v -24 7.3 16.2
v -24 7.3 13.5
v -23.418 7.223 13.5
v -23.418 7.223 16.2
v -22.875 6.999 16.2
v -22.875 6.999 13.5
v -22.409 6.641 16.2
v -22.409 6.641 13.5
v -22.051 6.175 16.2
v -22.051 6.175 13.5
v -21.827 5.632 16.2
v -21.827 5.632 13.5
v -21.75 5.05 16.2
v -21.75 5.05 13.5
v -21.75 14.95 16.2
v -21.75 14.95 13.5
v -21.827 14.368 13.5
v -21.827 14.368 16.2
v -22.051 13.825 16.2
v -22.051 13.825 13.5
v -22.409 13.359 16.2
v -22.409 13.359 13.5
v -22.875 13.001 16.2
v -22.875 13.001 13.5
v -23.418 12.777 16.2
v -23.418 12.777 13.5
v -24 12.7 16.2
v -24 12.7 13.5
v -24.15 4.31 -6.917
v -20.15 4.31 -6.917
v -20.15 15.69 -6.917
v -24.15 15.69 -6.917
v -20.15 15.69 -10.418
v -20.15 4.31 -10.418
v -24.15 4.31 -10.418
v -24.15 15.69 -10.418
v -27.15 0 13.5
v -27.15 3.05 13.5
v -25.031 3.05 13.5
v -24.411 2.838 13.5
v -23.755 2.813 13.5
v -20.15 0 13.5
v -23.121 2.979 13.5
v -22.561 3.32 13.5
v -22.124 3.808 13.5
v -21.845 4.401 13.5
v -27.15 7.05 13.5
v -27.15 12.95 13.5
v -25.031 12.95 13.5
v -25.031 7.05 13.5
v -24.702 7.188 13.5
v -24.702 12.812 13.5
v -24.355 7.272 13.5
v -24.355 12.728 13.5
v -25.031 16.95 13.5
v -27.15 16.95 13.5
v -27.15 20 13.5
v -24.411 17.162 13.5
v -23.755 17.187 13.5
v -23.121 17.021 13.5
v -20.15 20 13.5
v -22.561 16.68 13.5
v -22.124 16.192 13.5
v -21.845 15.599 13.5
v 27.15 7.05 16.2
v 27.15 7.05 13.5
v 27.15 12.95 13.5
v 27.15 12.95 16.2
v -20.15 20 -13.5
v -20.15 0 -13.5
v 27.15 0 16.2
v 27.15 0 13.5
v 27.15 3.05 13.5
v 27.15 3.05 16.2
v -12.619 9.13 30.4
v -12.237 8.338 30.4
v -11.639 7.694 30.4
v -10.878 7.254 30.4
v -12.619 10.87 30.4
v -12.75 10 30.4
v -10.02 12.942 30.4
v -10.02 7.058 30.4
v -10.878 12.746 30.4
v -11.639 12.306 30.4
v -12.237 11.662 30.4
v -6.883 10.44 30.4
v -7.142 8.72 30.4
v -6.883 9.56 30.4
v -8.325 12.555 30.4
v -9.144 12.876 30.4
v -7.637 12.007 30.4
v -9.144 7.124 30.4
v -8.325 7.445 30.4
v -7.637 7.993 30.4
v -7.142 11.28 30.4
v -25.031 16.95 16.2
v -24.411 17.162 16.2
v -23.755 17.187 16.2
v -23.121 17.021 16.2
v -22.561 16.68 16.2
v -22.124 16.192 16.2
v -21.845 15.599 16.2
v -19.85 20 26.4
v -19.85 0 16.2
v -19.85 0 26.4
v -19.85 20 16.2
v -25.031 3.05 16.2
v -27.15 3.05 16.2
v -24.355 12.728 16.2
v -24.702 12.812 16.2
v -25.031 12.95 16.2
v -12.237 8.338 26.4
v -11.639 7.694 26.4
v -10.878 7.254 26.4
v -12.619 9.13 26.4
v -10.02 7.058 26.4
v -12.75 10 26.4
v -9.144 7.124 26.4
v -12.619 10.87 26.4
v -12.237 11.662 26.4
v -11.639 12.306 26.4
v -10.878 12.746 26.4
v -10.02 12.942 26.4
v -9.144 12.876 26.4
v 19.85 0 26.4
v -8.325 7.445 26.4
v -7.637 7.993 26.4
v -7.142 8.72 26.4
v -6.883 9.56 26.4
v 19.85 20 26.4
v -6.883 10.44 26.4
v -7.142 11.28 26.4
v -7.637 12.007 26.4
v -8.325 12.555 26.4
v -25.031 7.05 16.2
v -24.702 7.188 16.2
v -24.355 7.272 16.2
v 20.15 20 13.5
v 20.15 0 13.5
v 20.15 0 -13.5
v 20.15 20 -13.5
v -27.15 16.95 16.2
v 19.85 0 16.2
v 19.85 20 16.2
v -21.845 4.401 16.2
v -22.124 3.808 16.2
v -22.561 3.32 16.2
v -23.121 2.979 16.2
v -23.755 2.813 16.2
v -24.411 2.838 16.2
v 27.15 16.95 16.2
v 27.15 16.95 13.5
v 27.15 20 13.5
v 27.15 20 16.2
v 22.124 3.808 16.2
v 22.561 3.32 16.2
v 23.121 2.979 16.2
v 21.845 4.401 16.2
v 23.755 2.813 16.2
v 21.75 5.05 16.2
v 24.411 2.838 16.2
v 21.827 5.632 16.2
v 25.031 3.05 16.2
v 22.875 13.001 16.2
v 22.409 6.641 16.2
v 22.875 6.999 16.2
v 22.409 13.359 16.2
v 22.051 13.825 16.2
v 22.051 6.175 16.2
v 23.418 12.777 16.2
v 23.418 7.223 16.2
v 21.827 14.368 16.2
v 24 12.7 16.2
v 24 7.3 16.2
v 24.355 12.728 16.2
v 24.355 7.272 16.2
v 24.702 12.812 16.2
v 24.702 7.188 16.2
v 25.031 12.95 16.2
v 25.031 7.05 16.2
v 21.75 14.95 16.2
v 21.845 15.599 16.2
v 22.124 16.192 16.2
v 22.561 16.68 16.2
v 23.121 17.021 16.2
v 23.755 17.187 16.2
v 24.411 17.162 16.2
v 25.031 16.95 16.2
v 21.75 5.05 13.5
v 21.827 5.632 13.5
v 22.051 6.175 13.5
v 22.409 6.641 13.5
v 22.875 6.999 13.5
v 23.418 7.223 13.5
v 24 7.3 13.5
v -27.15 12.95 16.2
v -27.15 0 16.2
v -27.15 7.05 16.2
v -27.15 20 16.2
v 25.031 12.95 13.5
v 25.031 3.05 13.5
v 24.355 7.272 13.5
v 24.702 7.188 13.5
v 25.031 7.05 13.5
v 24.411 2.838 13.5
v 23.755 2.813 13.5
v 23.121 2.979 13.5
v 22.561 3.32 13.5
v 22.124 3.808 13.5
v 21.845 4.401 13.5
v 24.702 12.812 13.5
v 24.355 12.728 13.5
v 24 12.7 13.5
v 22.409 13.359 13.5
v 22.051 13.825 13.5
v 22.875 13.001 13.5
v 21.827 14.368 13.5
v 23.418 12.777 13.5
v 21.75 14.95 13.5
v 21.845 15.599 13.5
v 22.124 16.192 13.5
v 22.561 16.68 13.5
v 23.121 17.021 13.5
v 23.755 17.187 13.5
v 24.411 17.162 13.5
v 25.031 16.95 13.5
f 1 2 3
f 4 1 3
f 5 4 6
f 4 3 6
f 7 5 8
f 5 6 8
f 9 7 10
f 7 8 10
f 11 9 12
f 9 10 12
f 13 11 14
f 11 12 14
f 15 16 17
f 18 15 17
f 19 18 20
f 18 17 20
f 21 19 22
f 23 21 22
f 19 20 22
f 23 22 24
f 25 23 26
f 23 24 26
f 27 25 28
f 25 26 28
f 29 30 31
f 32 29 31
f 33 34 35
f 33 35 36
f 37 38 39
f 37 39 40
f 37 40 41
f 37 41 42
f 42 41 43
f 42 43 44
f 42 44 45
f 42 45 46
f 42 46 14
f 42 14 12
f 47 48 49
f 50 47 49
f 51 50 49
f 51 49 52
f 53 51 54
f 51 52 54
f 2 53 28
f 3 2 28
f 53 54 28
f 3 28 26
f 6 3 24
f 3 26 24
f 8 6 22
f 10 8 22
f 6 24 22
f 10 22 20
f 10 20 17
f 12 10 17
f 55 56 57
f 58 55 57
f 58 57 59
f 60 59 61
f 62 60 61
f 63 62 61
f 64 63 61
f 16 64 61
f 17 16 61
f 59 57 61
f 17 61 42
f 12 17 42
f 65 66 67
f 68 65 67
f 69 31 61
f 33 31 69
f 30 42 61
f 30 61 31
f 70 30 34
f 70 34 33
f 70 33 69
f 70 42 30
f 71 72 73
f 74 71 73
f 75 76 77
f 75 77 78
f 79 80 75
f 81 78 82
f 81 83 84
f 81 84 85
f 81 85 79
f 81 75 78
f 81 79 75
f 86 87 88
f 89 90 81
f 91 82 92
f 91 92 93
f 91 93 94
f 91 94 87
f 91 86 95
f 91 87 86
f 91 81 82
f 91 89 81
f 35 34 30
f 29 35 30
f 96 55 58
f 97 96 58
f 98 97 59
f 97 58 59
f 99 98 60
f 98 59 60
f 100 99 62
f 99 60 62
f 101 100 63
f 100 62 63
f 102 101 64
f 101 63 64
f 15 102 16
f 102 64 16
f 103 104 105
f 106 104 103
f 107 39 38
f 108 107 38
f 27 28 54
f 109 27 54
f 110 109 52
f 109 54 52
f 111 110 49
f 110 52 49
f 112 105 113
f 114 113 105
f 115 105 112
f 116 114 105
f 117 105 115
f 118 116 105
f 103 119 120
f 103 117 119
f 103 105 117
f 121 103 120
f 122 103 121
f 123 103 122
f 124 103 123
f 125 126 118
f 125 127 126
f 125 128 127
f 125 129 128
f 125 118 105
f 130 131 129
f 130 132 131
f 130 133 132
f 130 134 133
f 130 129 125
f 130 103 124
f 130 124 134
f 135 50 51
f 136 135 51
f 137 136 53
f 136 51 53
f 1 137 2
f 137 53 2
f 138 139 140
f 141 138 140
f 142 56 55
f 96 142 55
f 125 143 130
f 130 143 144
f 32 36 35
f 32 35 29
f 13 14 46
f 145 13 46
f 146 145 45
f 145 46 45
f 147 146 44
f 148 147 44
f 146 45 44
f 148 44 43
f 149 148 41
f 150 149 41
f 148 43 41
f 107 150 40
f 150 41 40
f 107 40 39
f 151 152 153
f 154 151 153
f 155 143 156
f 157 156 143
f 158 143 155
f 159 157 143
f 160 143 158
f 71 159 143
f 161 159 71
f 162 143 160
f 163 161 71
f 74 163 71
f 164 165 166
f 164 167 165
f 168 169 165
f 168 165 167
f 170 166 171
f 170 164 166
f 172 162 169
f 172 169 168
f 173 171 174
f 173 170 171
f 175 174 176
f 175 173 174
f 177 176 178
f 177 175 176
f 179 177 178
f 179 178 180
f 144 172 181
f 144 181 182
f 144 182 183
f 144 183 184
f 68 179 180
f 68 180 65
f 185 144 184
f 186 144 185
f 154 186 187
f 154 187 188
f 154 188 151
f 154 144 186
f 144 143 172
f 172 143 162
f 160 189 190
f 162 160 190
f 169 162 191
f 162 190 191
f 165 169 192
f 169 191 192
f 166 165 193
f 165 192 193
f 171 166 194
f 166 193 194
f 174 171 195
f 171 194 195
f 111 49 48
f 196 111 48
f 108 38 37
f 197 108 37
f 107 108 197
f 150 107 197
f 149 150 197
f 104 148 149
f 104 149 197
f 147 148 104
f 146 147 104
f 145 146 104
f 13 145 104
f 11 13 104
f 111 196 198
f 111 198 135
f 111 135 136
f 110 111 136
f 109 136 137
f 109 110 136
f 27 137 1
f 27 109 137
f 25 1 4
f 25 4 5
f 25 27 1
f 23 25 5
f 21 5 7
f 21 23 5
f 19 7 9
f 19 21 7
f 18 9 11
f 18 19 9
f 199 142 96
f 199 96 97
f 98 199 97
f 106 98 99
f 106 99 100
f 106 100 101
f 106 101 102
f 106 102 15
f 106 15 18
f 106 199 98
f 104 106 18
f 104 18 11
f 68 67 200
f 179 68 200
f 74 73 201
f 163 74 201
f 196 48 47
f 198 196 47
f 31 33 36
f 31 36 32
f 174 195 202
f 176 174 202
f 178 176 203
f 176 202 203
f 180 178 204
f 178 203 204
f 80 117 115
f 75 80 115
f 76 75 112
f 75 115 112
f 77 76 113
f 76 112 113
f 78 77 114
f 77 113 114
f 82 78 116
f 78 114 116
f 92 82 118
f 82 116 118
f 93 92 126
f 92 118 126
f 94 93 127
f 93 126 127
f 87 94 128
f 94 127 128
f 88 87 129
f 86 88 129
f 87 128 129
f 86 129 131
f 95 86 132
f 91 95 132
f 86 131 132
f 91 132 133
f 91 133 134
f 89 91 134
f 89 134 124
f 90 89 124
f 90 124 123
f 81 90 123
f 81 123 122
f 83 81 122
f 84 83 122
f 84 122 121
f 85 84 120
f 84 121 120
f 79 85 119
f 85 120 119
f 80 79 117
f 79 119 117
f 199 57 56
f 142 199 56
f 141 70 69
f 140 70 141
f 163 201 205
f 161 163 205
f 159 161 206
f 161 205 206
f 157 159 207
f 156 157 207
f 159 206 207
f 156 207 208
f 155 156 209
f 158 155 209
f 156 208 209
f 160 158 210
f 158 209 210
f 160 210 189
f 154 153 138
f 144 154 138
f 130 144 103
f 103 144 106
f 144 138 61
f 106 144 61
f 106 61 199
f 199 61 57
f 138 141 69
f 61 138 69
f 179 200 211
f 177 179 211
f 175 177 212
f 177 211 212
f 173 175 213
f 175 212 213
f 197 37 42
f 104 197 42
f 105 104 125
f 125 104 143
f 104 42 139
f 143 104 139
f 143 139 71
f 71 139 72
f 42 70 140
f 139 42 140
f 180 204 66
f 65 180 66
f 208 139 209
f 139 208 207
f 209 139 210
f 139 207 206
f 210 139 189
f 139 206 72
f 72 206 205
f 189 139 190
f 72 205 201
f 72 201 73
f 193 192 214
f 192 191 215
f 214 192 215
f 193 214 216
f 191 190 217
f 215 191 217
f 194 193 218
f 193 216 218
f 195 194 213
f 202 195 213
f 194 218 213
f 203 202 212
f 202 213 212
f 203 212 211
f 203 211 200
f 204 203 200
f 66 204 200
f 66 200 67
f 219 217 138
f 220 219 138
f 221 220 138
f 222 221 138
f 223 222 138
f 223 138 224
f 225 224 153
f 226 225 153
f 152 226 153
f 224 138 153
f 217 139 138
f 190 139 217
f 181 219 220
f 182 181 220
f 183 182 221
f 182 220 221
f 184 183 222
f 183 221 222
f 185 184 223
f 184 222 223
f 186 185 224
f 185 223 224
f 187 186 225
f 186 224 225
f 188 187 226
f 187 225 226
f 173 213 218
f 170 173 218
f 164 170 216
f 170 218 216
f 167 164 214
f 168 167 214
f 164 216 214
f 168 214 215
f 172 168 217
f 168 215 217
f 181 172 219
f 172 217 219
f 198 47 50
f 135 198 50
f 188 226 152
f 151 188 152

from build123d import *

# Parameters (mm, degrees)
SKETCH1_W           = 40.3
SKETCH1_H           = 27
BOSS_EXTRUDE1_DEPTH = 20
SKETCH2_W           = 40.3
SKETCH2_H           = 5.05
SKETCH2_H_2         = 9.9
BOSS_EXTRUDE2_DEPTH = 2.7
SKETCH3_W           = 39.7
SKETCH3_H           = 20
BOSS_EXTRUDE3_DEPTH = 10.2
BOSS_EXTRUDE4_DEPTH = 4
SKETCH5_W           = 3.501362038
SKETCH5_H           = 11.379426624
BOSS_EXTRUDE5_DEPTH = 4


with BuildPart() as part:
    # Sketch1 → Boss-Extrude1 (new body)
    with BuildSketch(Plane(origin=(0, 0, 0), x_dir=(1, 0, 0), z_dir=(0, 1, 0))):
        Rectangle(SKETCH1_W, SKETCH1_H)
    extrude(amount=BOSS_EXTRUDE1_DEPTH)

    # Sketch2 → Boss-Extrude2 (add)
    with BuildSketch(Plane.XY.offset(13.5)):
        with Locations((0, 2.525)):
            Rectangle(SKETCH2_W, SKETCH2_H)
        with BuildLine():
            Line((-20.15, 0), (-20.15, 5.05))
            Line((-20.15, 5.05), (-21.75, 5.05))
            ThreePointArc((-21.75, 5.05), (-22.82883539, 3.12883539), (-25.030776406, 3.05))
            Line((-25.030776406, 3.05), (-27.15, 3.05))
            Line((-27.15, 3.05), (-27.15, 0))
            Line((-27.15, 0), (-20.15, 0))
        make_face()
        with Locations((0, 10)):
            Rectangle(SKETCH2_W, SKETCH2_H_2)
        with BuildLine():
            Line((-20.15, 5.05), (-20.15, 14.95))
            Line((-20.15, 14.95), (-21.75, 14.95))
            ThreePointArc((-21.75, 14.95), (-22.409009742, 13.359009742), (-24, 12.7))
            Line((-24, 12.7), (-24, 7.3))
            ThreePointArc((-24, 7.3), (-22.409009742, 6.640990258), (-21.75, 5.05))
            Line((-21.75, 5.05), (-20.15, 5.05))
        make_face()
        with BuildLine():
            Line((-25.030776406, 12.95), (-27.15, 12.95))
            Line((-27.15, 12.95), (-27.15, 7.05))
            Line((-27.15, 7.05), (-25.030776406, 7.05))
            ThreePointArc((-25.030776406, 7.05), (-24.530330086, 7.236606961), (-24, 7.3))
            Line((-24, 7.3), (-24, 12.7))
            ThreePointArc((-24, 12.7), (-24.530330086, 12.763393039), (-25.030776406, 12.95))
        make_face()
        with Locations((0, 17.475)):
            Rectangle(SKETCH2_W, SKETCH2_H)
        with BuildLine():
            Line((-20.15, 14.95), (-20.15, 20))
            Line((-20.15, 20), (-27.15, 20))
            Line((-27.15, 20), (-27.15, 16.95))
            Line((-27.15, 16.95), (-25.030776406, 16.95))
            ThreePointArc((-25.030776406, 16.95), (-22.82883539, 16.87116461), (-21.75, 14.95))
            Line((-21.75, 14.95), (-20.15, 14.95))
        make_face()
        with BuildLine():
            Line((27.15, 20), (20.15, 20))
            Line((20.15, 20), (20.15, 14.95))
            Line((20.15, 14.95), (21.75, 14.95))
            ThreePointArc((21.75, 14.95), (22.82883539, 16.87116461), (25.030776406, 16.95))
            Line((25.030776406, 16.95), (27.15, 16.95))
            Line((27.15, 16.95), (27.15, 20))
        make_face()
        with BuildLine():
            Line((27.15, 7.05), (27.15, 12.95))
            Line((27.15, 12.95), (25.030776406, 12.95))
            ThreePointArc((25.030776406, 12.95), (24.530330086, 12.763393039), (24, 12.7))
            Line((24, 12.7), (24, 7.3))
            ThreePointArc((24, 7.3), (24.530330086, 7.236606961), (25.030776406, 7.05))
            Line((25.030776406, 7.05), (27.15, 7.05))
        make_face()
        with BuildLine():
            Line((21.75, 5.05), (20.15, 5.05))
            Line((20.15, 5.05), (20.15, 0))
            Line((20.15, 0), (27.15, 0))
            Line((27.15, 0), (27.15, 3.05))
            Line((27.15, 3.05), (25.030776406, 3.05))
            ThreePointArc((25.030776406, 3.05), (22.82883539, 3.12883539), (21.75, 5.05))
        make_face()
        with BuildLine():
            Line((21.75, 14.95), (20.15, 14.95))
            Line((20.15, 14.95), (20.15, 5.05))
            Line((20.15, 5.05), (21.75, 5.05))
            ThreePointArc((21.75, 5.05), (22.409009742, 6.640990258), (24, 7.3))
            Line((24, 7.3), (24, 12.7))
            ThreePointArc((24, 12.7), (22.409009742, 13.359009742), (21.75, 14.95))
        make_face()
    extrude(amount=BOSS_EXTRUDE2_DEPTH)

    # Sketch3 → Boss-Extrude3 (add)
    with BuildSketch(Plane.XY.offset(16.2)):
        with Locations((0, 10)):
            Rectangle(SKETCH3_W, SKETCH3_H)
    extrude(amount=BOSS_EXTRUDE3_DEPTH)

    # Sketch4 → Boss-Extrude4 (add)
    with BuildSketch(Plane.XY.offset(26.4)):
        with BuildLine():
            ThreePointArc((-6.85, 10), (-9.8, 12.95), (-12.75, 10))
            Line((-12.75, 10), (-6.85, 10))
        make_face()
        with BuildLine():
            Line((-6.85, 10), (-12.75, 10))
            ThreePointArc((-12.75, 10), (-9.8, 7.05), (-6.85, 10))
        make_face()
    extrude(amount=BOSS_EXTRUDE4_DEPTH)

    # Sketch5 → Boss-Extrude5 (add)
    with BuildSketch(Plane.ZY.offset(20.15)):
        with Locations((-8.667769888, 10)):
            Rectangle(SKETCH5_W, SKETCH5_H)
    extrude(amount=BOSS_EXTRUDE5_DEPTH)


solid = part.part
